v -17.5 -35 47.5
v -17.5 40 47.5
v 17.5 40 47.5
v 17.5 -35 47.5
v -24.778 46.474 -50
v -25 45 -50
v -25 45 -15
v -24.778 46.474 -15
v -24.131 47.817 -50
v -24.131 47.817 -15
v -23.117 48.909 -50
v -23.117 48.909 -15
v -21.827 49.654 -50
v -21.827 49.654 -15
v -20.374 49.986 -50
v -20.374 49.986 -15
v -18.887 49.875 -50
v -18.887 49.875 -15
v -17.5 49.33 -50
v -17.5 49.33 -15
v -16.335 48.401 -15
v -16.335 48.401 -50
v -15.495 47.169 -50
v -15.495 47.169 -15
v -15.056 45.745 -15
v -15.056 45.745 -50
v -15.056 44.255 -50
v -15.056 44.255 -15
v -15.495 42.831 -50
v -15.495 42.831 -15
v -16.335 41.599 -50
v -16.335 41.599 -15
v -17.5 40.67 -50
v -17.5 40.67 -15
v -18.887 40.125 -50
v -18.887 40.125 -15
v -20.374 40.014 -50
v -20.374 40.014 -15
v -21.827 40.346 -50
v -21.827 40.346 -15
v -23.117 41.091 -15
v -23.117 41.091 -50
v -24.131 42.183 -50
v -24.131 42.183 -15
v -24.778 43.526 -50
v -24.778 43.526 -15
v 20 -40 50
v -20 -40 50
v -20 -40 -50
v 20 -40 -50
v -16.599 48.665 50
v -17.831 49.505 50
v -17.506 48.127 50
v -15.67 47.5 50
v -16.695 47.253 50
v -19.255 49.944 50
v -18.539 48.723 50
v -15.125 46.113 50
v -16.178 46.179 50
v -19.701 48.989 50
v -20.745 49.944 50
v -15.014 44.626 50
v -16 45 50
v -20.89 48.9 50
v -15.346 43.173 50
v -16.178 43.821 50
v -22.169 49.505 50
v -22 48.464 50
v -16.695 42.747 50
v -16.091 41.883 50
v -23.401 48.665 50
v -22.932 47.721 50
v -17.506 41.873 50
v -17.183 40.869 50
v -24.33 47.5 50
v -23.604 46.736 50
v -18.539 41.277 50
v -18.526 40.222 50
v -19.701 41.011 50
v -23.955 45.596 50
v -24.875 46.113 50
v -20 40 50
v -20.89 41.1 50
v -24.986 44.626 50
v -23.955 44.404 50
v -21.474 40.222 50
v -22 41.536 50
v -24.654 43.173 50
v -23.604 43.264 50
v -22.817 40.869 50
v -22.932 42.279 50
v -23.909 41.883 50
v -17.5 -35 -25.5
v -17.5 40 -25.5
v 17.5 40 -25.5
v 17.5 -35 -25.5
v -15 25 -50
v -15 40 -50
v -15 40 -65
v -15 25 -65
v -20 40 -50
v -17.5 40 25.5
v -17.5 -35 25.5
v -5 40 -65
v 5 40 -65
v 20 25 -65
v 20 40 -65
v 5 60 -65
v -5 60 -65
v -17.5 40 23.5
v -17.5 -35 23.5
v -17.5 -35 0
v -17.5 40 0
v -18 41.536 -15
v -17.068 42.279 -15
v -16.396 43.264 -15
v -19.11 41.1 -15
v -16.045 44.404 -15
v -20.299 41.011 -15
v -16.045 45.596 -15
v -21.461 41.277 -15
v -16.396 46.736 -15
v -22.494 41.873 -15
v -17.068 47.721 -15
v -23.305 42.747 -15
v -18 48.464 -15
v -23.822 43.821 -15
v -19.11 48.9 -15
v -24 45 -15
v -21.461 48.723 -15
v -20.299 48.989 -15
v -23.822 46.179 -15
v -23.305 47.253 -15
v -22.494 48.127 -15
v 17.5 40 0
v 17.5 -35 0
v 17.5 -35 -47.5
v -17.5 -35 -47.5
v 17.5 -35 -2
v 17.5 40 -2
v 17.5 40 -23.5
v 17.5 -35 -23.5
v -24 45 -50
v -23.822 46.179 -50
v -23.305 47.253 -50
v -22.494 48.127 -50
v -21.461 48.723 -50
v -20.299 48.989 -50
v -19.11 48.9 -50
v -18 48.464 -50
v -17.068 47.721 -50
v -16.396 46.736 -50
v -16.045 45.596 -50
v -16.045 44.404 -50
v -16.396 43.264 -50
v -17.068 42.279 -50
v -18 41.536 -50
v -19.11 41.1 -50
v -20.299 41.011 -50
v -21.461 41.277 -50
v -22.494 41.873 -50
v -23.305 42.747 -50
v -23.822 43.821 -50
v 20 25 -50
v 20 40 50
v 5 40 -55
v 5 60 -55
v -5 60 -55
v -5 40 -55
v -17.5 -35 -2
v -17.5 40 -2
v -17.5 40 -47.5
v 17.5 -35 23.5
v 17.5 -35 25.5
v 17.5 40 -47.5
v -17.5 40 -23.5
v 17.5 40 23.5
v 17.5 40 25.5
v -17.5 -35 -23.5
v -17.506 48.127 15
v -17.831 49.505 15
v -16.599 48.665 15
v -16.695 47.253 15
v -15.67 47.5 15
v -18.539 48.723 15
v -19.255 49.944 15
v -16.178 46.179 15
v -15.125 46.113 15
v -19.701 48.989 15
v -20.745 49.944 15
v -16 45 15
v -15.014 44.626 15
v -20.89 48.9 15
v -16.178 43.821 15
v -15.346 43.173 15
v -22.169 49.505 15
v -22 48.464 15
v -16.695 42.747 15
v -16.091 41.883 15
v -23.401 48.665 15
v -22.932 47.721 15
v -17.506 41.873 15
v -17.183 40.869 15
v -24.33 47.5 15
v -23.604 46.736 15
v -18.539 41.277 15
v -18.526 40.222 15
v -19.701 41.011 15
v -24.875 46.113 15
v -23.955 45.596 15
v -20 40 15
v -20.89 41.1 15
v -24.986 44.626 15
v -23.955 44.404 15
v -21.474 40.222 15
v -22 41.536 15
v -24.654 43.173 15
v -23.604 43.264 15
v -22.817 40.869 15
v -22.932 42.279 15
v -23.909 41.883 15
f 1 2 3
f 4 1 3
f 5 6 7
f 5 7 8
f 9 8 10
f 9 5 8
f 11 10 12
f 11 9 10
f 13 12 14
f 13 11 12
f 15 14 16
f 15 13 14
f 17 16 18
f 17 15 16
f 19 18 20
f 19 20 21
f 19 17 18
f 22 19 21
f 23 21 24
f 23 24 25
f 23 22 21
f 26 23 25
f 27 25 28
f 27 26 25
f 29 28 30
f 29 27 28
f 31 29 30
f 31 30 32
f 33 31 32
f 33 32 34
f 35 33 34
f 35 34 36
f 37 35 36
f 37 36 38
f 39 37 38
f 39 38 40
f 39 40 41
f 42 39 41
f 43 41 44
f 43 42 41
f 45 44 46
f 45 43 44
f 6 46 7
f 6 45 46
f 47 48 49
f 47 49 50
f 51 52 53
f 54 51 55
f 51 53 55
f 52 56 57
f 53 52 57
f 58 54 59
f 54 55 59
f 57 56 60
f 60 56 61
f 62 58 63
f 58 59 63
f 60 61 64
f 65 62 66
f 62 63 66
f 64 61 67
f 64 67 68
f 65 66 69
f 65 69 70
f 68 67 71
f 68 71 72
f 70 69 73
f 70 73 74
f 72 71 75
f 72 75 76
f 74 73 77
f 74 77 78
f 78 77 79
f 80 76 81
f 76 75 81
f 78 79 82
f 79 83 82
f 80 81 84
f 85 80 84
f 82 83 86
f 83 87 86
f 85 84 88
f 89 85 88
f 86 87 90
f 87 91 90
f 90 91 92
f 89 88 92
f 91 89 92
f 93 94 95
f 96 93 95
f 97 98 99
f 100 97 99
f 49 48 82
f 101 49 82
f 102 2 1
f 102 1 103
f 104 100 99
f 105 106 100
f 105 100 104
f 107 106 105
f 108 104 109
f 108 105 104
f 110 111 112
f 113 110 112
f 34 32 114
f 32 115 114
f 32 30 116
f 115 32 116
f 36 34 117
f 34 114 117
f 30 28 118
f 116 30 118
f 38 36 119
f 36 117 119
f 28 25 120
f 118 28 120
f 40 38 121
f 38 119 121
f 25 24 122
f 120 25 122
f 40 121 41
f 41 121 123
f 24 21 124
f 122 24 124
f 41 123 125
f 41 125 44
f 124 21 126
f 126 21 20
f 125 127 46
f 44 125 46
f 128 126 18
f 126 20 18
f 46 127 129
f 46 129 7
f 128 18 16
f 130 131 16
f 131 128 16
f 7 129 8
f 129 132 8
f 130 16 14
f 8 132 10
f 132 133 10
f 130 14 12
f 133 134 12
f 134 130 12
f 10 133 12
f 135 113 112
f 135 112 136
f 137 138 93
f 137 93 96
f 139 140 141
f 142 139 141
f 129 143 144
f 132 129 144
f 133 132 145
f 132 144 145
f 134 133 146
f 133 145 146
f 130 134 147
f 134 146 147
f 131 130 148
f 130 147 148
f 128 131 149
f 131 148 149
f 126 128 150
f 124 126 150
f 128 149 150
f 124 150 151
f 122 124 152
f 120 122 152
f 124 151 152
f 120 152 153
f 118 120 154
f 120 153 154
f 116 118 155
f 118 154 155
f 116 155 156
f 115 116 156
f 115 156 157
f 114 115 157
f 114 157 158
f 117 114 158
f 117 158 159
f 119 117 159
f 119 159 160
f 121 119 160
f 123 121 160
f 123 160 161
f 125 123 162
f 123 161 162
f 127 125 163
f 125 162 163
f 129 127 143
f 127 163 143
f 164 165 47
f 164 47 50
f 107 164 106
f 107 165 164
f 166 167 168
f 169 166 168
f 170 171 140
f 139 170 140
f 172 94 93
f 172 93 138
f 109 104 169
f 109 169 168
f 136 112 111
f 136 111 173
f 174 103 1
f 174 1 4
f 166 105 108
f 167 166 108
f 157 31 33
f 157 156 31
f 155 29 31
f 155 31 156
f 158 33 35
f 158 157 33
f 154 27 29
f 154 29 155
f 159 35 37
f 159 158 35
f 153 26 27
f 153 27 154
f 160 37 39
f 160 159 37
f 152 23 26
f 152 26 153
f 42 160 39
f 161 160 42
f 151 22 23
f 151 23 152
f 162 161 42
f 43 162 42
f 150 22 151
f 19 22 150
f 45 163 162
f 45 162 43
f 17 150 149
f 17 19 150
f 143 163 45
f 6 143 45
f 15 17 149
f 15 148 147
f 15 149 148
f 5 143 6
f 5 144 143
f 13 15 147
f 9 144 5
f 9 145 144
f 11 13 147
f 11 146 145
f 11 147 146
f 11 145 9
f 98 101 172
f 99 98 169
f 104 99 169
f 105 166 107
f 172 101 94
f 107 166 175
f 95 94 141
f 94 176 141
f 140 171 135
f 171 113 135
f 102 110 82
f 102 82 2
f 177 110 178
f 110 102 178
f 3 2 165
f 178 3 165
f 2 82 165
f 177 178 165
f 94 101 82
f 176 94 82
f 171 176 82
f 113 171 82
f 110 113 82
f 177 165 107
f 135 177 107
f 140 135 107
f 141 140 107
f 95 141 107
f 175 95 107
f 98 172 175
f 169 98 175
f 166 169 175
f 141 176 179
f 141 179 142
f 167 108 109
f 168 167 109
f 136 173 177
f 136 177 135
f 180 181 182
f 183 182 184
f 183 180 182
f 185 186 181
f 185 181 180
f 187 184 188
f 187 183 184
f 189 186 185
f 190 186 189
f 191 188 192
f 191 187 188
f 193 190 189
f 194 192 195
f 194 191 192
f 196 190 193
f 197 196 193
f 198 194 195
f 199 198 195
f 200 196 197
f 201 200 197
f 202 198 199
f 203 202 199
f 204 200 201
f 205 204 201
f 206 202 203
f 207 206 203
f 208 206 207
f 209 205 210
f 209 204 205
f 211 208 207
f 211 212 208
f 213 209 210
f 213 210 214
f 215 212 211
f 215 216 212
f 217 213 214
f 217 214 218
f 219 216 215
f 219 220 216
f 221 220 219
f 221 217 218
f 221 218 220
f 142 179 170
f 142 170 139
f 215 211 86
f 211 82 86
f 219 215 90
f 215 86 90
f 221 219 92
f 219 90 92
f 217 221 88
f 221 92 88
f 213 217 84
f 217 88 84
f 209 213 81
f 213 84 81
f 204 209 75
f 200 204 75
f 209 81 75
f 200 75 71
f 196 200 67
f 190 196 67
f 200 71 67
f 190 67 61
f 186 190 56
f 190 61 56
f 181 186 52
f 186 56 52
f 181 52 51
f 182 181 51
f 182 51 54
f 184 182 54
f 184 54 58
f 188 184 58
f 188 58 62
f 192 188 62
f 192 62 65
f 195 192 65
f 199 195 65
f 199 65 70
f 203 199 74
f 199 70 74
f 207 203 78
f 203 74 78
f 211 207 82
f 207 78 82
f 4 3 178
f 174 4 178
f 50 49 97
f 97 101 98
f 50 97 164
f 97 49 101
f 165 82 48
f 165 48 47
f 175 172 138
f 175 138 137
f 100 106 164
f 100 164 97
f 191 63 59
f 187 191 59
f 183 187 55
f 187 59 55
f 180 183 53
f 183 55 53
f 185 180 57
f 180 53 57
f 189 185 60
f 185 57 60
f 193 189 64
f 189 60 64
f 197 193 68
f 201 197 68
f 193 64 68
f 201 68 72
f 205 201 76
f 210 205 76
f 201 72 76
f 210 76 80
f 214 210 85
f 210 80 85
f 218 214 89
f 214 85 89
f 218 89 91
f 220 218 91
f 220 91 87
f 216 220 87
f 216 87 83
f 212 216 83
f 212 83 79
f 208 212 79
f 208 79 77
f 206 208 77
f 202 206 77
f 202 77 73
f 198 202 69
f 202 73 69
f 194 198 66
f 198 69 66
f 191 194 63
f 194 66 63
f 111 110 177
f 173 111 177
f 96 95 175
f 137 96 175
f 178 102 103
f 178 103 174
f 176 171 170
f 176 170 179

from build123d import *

# Parameters (mm, degrees)
SKETCH1_W           = 40
SKETCH1_H           = 80
BOSS_EXTRUDE1_DEPTH = 50
SKETCH2_W           = 35
SKETCH2_H           = 22
SKETCH2_H_2         = 23.5
SKETCH2_H_3         = 21.5
CUT_EXTRUDE2_DEPTH  = 75
SKETCH7_W           = 35
SKETCH7_H           = 5
SKETCH9_R           = 4
CUT_EXTRUDE3_DEPTH  = 35
SKETCH12_R          = 5
SKETCH12_R_2        = 4
BOSS_EXTRUDE2_DEPTH = 35
SKETCH14_W          = 15
SKETCH14_H          = 15
BOSS_EXTRUDE3_DEPTH = 35
SKETCH15_W          = 10
SKETCH15_H          = 35
BOSS_EXTRUDE4_DEPTH = 10


with BuildPart() as part:
    # Sketch1 → Boss-Extrude1 (new, symmetric)
    with BuildSketch(Plane.XY):
        Rectangle(SKETCH1_W, SKETCH1_H)
    extrude(amount=BOSS_EXTRUDE1_DEPTH, both=True)

    # Sketch2 → Cut-Extrude2 (cut)
    with BuildSketch(Plane(origin=(0, 40, 0), x_dir=(1, 0, 0), z_dir=(0, 1, 0))):
        with Locations((0, -36.5)):
            Rectangle(SKETCH2_W, SKETCH2_H)
        with Locations((0, -11.75)):
            Rectangle(SKETCH2_W, SKETCH2_H_2)
        with Locations((0, 12.75)):
            Rectangle(SKETCH2_W, SKETCH2_H_3)
        with Locations((0, 36.5)):
            Rectangle(SKETCH2_W, SKETCH2_H)
    extrude(amount=-CUT_EXTRUDE2_DEPTH, mode=Mode.SUBTRACT)

    # Sketch14 → Boss-Extrude3 (add)
    with BuildSketch(Plane(origin=(20, 0, 0), x_dir=(0, 0, -1), z_dir=(1, 0, 0))):
        with Locations((57.5, 32.5)):
            Rectangle(SKETCH14_W, SKETCH14_H)
    extrude(amount=-BOSS_EXTRUDE3_DEPTH)

    # Sketch15 → Boss-Extrude4 (add)
    with BuildSketch(Plane(origin=(0, 0, -65), x_dir=(-1, 0, 0), z_dir=(0, 0, -1))):
        with Locations((0, 42.5)):
            Rectangle(SKETCH15_W, SKETCH15_H)
    extrude(amount=-BOSS_EXTRUDE4_DEPTH)


with BuildPart() as body_2:
    # Sketch7 → Revolve-Thin1 (revolve)
    with BuildSketch(Plane.ZY.offset(20)):
        with Locations((32.5, 42.5)):
            Rectangle(SKETCH7_W, SKETCH7_H)
    revolve(axis=Axis((-20, 45, 50), (0, 0, -1)))

    # Sketch9 → Cut-Extrude3 (cut)
    with BuildSketch(Plane.XY.offset(50)):
        with Locations((-20, 45)):
            Circle(SKETCH9_R)
    extrude(amount=-CUT_EXTRUDE3_DEPTH, mode=Mode.SUBTRACT)


with BuildPart() as body_3:
    # Sketch12 → Boss-Extrude2 (new body)
    with BuildSketch(Plane(origin=(0, 0, -50), x_dir=(-1, 0, 0), z_dir=(0, 0, -1))):
        with Locations((20, 45)):
            Circle(SKETCH12_R)
        with Locations((20, 45)):
            Circle(SKETCH12_R_2, mode=Mode.SUBTRACT)
    extrude(amount=-BOSS_EXTRUDE2_DEPTH)


solid = Compound([part.part, body_2.part, body_3.part])
